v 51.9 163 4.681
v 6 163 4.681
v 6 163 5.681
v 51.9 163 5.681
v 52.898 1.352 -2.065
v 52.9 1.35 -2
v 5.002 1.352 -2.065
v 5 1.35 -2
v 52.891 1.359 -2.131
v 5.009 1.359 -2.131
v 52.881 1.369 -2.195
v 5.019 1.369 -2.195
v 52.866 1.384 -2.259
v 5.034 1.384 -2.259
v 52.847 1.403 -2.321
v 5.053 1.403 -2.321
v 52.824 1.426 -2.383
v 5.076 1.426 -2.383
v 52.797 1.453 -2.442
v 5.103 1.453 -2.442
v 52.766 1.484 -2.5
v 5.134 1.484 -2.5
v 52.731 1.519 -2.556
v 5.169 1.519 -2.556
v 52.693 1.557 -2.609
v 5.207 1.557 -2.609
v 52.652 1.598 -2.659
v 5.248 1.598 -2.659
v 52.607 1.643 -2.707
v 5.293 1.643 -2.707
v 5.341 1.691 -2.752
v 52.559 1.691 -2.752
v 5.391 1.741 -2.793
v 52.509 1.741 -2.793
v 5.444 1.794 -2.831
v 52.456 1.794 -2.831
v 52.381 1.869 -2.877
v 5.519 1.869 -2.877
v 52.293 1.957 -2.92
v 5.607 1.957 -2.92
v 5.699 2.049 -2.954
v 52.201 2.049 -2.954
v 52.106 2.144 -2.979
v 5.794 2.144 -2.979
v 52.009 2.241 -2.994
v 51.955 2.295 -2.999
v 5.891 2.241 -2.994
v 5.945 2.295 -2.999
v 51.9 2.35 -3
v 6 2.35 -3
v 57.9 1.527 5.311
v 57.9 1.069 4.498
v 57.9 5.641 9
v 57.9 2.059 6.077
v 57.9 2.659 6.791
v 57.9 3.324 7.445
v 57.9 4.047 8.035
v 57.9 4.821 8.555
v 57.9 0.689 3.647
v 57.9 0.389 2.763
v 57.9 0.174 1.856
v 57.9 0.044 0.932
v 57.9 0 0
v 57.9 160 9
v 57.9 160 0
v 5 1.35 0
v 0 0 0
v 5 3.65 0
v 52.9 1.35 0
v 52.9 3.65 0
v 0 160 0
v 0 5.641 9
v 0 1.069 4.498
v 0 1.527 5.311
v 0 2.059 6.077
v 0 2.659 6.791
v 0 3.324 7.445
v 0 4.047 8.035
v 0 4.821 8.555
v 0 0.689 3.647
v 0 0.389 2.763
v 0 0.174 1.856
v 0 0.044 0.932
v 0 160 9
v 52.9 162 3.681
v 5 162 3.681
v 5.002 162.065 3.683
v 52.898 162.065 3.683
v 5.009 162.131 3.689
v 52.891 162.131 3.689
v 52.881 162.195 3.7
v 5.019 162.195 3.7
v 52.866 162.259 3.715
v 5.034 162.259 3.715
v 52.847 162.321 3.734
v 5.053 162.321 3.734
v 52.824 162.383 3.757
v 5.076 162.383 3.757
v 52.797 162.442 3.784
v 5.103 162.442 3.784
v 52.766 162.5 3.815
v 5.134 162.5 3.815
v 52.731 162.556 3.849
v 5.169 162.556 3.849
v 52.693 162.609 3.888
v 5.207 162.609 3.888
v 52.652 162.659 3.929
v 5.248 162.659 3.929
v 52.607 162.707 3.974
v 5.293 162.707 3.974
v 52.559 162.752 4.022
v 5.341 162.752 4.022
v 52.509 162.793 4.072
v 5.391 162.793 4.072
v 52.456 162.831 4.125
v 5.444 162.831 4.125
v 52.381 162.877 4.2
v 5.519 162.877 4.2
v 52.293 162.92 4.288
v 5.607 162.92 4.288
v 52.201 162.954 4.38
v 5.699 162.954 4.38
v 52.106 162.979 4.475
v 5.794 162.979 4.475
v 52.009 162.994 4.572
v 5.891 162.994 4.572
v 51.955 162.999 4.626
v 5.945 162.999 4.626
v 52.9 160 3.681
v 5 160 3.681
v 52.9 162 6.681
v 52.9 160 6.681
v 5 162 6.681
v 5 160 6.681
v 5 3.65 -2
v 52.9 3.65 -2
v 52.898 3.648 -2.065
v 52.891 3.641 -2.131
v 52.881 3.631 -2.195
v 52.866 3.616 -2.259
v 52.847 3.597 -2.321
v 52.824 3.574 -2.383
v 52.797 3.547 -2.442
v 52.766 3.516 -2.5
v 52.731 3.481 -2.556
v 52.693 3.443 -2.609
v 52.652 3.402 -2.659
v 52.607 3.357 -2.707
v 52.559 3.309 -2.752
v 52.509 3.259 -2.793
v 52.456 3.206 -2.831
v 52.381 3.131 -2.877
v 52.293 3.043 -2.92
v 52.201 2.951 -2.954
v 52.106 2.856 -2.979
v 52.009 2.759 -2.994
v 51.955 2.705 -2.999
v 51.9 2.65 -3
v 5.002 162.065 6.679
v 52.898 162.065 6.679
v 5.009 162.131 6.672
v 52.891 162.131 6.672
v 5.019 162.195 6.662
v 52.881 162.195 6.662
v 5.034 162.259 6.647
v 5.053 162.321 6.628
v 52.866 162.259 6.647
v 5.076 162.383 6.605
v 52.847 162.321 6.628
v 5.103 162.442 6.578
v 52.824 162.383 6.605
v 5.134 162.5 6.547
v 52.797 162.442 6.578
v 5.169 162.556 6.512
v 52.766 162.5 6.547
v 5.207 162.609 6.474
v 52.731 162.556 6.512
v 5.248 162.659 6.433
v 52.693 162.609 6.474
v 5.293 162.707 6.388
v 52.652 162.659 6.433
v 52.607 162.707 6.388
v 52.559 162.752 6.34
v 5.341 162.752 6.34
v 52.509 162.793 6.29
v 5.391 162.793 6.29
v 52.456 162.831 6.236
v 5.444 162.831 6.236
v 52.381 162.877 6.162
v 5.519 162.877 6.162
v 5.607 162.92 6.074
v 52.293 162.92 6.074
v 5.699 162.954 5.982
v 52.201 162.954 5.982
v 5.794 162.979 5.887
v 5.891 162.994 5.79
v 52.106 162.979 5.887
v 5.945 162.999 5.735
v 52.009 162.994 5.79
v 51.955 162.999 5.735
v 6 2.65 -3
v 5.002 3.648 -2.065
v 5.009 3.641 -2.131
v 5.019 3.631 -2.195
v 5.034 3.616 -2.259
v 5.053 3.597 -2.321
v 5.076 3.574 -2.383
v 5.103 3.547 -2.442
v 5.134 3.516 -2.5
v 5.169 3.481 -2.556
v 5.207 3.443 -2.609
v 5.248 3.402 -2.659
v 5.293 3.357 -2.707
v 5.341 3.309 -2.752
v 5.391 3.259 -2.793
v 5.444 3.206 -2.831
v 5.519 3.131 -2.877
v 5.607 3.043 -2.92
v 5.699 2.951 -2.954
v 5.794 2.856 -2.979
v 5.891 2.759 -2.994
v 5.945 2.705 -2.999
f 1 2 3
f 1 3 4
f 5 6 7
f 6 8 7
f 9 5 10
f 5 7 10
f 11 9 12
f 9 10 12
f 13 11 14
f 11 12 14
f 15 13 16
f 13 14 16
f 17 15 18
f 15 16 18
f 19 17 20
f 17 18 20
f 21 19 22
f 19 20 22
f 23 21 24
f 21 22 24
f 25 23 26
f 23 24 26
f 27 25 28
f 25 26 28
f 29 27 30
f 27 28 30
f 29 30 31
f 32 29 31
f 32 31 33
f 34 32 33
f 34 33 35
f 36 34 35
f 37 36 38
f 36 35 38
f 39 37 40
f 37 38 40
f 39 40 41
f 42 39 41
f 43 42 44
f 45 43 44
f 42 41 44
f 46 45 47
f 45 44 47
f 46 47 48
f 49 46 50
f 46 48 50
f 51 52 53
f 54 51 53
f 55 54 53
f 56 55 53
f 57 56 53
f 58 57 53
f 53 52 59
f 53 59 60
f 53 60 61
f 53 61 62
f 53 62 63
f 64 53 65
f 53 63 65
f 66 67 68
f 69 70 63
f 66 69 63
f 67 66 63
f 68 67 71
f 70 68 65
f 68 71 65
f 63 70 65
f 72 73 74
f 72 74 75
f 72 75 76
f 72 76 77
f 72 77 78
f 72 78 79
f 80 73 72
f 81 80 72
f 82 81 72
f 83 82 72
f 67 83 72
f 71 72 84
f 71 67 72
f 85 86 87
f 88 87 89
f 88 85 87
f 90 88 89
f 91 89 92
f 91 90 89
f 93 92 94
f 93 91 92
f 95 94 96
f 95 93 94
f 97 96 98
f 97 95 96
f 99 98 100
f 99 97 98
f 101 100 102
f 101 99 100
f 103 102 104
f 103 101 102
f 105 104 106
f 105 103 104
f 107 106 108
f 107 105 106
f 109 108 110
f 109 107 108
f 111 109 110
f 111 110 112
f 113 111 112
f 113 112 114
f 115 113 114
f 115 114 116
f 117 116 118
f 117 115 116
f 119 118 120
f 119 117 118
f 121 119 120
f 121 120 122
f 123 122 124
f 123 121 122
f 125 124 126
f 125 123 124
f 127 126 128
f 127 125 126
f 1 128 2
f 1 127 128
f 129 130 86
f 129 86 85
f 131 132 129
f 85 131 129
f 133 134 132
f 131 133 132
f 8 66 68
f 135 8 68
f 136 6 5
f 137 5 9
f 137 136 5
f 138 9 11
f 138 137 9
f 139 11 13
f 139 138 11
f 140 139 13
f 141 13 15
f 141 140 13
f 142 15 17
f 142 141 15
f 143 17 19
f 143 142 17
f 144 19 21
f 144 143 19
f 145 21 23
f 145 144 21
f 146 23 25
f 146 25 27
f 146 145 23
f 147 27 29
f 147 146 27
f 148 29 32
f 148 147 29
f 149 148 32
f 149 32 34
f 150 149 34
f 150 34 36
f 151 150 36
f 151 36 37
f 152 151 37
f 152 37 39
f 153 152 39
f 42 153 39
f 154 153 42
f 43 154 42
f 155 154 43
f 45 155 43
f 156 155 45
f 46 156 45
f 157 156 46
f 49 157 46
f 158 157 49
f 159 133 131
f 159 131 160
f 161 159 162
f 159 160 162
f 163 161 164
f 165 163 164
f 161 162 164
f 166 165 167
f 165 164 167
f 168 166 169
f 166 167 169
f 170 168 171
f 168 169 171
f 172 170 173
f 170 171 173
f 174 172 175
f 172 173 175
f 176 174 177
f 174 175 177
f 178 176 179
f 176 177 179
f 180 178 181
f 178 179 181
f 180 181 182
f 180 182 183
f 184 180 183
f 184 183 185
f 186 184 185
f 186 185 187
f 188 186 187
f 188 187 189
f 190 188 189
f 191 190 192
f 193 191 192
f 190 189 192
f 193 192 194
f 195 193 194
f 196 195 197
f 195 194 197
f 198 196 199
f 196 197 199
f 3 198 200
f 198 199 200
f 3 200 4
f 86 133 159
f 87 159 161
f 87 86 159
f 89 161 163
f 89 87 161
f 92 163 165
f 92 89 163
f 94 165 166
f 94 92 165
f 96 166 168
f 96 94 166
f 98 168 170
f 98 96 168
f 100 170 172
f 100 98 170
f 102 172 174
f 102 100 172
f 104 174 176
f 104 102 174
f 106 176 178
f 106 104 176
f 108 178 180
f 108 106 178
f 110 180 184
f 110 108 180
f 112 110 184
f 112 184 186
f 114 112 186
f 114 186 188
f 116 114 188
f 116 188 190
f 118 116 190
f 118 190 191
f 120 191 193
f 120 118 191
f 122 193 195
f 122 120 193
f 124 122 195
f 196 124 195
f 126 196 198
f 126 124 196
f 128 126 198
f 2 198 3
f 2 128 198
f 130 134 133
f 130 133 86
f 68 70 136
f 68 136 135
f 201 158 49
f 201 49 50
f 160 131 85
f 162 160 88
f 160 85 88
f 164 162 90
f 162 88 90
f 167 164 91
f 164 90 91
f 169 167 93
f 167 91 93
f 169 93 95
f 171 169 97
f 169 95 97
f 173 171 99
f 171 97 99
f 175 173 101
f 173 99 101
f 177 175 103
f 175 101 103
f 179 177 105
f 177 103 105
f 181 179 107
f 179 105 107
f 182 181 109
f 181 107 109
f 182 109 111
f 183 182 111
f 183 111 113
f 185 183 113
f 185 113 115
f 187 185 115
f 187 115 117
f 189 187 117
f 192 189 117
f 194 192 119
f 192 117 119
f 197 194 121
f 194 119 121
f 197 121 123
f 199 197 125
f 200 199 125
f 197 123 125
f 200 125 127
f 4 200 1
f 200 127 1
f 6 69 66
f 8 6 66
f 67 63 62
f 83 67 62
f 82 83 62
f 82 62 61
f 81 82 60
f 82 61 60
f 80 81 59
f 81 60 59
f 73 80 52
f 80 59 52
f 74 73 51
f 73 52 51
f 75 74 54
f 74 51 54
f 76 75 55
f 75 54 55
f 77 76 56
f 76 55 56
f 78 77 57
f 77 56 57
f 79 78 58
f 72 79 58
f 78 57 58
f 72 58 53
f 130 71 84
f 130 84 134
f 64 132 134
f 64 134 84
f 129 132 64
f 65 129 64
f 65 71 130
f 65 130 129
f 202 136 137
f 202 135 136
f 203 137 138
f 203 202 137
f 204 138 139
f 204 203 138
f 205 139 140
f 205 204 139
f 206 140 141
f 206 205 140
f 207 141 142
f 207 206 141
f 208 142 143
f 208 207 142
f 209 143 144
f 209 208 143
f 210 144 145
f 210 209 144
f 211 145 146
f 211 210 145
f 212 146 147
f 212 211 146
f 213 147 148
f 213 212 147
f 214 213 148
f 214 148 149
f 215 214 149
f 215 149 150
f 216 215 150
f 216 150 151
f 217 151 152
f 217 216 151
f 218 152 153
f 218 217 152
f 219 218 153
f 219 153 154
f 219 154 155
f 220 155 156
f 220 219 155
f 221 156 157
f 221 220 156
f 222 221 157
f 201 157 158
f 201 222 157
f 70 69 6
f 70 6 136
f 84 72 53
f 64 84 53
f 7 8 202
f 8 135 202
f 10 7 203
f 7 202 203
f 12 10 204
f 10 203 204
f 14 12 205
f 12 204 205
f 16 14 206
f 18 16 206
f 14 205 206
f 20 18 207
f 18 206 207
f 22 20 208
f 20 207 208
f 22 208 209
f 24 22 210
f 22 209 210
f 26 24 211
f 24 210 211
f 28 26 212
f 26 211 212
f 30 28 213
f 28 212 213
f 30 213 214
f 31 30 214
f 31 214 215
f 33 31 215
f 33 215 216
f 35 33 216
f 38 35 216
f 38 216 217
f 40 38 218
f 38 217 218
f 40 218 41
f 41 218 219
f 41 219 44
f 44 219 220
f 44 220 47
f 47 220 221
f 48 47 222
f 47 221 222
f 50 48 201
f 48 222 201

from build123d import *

# Parameters (mm, degrees)
SKETCH1_W           = 57.9
SKETCH1_H           = 160
BOSS_EXTRUDE2_DEPTH = 10
FILLET2_R           = 10
SKETCH2_W           = 47.9
SKETCH2_H           = 2.3
BOSS_EXTRUDE3_DEPTH = 3
FILLET3_R           = 1
SKETCH4_W           = 47.9
SKETCH4_H           = 3
BOSS_EXTRUDE4_DEPTH = 3
FILLET4_R           = 1
SKETCH5_W           = 57.9
SKETCH5_H           = 160
CUT_EXTRUDE1_DEPTH  = 1


with BuildPart() as part:
    # Sketch1 → Boss-Extrude2 (new body)
    with BuildSketch(Plane.XY):
        with Locations((28.95, 80)):
            Rectangle(SKETCH1_W, SKETCH1_H)
    extrude(amount=BOSS_EXTRUDE2_DEPTH)

    # Fillet2
    fillet2_edges = [part.edges().sort_by_distance(p)[0] for p in [
        (28.95, 0, 10),
    ]]
    fillet(fillet2_edges, radius=FILLET2_R - 0.0001)  # a hair under: the kernel refuses the full size

    # Sketch2 → Boss-Extrude3 (add)
    with BuildSketch(Plane(origin=(0, 0, 0), x_dir=(-1, 0, 0), z_dir=(0, 0, -1))):
        with Locations((-28.95, 2.5)):
            Rectangle(SKETCH2_W, SKETCH2_H)
    extrude(amount=BOSS_EXTRUDE3_DEPTH)

    # Fillet3
    fillet3_edges = [part.edges().sort_by_distance(p)[0] for p in [
        (52.9, 2.5, -3),
        (28.95, 1.35, -3),
        (5, 2.5, -3),
        (28.95, 3.65, -3),
    ]]
    fillet(fillet3_edges, radius=FILLET3_R)

    # Sketch4 → Boss-Extrude4 (add)
    with BuildSketch(Plane(origin=(0, 160, 0), x_dir=(1, 0, 0), z_dir=(0, 1, 0))):
        with Locations((28.95, -5.180907412)):
            Rectangle(SKETCH4_W, SKETCH4_H)
    extrude(amount=BOSS_EXTRUDE4_DEPTH)

    # Fillet4
    fillet4_edges = [part.edges().sort_by_distance(p)[0] for p in [
        (5, 163, 5.180907412),
        (28.95, 163, 6.680907412),
        (52.9, 163, 5.180907412),
        (28.95, 163, 3.680907412),
    ]]
    fillet(fillet4_edges, radius=FILLET4_R)

    # Sketch5 → Cut-Extrude1 (cut)
    with BuildSketch(Plane.XY.offset(10)):
        with Locations((28.95, 80)):
            Rectangle(SKETCH5_W, SKETCH5_H)
    extrude(amount=-CUT_EXTRUDE1_DEPTH, mode=Mode.SUBTRACT)


solid = part.part
